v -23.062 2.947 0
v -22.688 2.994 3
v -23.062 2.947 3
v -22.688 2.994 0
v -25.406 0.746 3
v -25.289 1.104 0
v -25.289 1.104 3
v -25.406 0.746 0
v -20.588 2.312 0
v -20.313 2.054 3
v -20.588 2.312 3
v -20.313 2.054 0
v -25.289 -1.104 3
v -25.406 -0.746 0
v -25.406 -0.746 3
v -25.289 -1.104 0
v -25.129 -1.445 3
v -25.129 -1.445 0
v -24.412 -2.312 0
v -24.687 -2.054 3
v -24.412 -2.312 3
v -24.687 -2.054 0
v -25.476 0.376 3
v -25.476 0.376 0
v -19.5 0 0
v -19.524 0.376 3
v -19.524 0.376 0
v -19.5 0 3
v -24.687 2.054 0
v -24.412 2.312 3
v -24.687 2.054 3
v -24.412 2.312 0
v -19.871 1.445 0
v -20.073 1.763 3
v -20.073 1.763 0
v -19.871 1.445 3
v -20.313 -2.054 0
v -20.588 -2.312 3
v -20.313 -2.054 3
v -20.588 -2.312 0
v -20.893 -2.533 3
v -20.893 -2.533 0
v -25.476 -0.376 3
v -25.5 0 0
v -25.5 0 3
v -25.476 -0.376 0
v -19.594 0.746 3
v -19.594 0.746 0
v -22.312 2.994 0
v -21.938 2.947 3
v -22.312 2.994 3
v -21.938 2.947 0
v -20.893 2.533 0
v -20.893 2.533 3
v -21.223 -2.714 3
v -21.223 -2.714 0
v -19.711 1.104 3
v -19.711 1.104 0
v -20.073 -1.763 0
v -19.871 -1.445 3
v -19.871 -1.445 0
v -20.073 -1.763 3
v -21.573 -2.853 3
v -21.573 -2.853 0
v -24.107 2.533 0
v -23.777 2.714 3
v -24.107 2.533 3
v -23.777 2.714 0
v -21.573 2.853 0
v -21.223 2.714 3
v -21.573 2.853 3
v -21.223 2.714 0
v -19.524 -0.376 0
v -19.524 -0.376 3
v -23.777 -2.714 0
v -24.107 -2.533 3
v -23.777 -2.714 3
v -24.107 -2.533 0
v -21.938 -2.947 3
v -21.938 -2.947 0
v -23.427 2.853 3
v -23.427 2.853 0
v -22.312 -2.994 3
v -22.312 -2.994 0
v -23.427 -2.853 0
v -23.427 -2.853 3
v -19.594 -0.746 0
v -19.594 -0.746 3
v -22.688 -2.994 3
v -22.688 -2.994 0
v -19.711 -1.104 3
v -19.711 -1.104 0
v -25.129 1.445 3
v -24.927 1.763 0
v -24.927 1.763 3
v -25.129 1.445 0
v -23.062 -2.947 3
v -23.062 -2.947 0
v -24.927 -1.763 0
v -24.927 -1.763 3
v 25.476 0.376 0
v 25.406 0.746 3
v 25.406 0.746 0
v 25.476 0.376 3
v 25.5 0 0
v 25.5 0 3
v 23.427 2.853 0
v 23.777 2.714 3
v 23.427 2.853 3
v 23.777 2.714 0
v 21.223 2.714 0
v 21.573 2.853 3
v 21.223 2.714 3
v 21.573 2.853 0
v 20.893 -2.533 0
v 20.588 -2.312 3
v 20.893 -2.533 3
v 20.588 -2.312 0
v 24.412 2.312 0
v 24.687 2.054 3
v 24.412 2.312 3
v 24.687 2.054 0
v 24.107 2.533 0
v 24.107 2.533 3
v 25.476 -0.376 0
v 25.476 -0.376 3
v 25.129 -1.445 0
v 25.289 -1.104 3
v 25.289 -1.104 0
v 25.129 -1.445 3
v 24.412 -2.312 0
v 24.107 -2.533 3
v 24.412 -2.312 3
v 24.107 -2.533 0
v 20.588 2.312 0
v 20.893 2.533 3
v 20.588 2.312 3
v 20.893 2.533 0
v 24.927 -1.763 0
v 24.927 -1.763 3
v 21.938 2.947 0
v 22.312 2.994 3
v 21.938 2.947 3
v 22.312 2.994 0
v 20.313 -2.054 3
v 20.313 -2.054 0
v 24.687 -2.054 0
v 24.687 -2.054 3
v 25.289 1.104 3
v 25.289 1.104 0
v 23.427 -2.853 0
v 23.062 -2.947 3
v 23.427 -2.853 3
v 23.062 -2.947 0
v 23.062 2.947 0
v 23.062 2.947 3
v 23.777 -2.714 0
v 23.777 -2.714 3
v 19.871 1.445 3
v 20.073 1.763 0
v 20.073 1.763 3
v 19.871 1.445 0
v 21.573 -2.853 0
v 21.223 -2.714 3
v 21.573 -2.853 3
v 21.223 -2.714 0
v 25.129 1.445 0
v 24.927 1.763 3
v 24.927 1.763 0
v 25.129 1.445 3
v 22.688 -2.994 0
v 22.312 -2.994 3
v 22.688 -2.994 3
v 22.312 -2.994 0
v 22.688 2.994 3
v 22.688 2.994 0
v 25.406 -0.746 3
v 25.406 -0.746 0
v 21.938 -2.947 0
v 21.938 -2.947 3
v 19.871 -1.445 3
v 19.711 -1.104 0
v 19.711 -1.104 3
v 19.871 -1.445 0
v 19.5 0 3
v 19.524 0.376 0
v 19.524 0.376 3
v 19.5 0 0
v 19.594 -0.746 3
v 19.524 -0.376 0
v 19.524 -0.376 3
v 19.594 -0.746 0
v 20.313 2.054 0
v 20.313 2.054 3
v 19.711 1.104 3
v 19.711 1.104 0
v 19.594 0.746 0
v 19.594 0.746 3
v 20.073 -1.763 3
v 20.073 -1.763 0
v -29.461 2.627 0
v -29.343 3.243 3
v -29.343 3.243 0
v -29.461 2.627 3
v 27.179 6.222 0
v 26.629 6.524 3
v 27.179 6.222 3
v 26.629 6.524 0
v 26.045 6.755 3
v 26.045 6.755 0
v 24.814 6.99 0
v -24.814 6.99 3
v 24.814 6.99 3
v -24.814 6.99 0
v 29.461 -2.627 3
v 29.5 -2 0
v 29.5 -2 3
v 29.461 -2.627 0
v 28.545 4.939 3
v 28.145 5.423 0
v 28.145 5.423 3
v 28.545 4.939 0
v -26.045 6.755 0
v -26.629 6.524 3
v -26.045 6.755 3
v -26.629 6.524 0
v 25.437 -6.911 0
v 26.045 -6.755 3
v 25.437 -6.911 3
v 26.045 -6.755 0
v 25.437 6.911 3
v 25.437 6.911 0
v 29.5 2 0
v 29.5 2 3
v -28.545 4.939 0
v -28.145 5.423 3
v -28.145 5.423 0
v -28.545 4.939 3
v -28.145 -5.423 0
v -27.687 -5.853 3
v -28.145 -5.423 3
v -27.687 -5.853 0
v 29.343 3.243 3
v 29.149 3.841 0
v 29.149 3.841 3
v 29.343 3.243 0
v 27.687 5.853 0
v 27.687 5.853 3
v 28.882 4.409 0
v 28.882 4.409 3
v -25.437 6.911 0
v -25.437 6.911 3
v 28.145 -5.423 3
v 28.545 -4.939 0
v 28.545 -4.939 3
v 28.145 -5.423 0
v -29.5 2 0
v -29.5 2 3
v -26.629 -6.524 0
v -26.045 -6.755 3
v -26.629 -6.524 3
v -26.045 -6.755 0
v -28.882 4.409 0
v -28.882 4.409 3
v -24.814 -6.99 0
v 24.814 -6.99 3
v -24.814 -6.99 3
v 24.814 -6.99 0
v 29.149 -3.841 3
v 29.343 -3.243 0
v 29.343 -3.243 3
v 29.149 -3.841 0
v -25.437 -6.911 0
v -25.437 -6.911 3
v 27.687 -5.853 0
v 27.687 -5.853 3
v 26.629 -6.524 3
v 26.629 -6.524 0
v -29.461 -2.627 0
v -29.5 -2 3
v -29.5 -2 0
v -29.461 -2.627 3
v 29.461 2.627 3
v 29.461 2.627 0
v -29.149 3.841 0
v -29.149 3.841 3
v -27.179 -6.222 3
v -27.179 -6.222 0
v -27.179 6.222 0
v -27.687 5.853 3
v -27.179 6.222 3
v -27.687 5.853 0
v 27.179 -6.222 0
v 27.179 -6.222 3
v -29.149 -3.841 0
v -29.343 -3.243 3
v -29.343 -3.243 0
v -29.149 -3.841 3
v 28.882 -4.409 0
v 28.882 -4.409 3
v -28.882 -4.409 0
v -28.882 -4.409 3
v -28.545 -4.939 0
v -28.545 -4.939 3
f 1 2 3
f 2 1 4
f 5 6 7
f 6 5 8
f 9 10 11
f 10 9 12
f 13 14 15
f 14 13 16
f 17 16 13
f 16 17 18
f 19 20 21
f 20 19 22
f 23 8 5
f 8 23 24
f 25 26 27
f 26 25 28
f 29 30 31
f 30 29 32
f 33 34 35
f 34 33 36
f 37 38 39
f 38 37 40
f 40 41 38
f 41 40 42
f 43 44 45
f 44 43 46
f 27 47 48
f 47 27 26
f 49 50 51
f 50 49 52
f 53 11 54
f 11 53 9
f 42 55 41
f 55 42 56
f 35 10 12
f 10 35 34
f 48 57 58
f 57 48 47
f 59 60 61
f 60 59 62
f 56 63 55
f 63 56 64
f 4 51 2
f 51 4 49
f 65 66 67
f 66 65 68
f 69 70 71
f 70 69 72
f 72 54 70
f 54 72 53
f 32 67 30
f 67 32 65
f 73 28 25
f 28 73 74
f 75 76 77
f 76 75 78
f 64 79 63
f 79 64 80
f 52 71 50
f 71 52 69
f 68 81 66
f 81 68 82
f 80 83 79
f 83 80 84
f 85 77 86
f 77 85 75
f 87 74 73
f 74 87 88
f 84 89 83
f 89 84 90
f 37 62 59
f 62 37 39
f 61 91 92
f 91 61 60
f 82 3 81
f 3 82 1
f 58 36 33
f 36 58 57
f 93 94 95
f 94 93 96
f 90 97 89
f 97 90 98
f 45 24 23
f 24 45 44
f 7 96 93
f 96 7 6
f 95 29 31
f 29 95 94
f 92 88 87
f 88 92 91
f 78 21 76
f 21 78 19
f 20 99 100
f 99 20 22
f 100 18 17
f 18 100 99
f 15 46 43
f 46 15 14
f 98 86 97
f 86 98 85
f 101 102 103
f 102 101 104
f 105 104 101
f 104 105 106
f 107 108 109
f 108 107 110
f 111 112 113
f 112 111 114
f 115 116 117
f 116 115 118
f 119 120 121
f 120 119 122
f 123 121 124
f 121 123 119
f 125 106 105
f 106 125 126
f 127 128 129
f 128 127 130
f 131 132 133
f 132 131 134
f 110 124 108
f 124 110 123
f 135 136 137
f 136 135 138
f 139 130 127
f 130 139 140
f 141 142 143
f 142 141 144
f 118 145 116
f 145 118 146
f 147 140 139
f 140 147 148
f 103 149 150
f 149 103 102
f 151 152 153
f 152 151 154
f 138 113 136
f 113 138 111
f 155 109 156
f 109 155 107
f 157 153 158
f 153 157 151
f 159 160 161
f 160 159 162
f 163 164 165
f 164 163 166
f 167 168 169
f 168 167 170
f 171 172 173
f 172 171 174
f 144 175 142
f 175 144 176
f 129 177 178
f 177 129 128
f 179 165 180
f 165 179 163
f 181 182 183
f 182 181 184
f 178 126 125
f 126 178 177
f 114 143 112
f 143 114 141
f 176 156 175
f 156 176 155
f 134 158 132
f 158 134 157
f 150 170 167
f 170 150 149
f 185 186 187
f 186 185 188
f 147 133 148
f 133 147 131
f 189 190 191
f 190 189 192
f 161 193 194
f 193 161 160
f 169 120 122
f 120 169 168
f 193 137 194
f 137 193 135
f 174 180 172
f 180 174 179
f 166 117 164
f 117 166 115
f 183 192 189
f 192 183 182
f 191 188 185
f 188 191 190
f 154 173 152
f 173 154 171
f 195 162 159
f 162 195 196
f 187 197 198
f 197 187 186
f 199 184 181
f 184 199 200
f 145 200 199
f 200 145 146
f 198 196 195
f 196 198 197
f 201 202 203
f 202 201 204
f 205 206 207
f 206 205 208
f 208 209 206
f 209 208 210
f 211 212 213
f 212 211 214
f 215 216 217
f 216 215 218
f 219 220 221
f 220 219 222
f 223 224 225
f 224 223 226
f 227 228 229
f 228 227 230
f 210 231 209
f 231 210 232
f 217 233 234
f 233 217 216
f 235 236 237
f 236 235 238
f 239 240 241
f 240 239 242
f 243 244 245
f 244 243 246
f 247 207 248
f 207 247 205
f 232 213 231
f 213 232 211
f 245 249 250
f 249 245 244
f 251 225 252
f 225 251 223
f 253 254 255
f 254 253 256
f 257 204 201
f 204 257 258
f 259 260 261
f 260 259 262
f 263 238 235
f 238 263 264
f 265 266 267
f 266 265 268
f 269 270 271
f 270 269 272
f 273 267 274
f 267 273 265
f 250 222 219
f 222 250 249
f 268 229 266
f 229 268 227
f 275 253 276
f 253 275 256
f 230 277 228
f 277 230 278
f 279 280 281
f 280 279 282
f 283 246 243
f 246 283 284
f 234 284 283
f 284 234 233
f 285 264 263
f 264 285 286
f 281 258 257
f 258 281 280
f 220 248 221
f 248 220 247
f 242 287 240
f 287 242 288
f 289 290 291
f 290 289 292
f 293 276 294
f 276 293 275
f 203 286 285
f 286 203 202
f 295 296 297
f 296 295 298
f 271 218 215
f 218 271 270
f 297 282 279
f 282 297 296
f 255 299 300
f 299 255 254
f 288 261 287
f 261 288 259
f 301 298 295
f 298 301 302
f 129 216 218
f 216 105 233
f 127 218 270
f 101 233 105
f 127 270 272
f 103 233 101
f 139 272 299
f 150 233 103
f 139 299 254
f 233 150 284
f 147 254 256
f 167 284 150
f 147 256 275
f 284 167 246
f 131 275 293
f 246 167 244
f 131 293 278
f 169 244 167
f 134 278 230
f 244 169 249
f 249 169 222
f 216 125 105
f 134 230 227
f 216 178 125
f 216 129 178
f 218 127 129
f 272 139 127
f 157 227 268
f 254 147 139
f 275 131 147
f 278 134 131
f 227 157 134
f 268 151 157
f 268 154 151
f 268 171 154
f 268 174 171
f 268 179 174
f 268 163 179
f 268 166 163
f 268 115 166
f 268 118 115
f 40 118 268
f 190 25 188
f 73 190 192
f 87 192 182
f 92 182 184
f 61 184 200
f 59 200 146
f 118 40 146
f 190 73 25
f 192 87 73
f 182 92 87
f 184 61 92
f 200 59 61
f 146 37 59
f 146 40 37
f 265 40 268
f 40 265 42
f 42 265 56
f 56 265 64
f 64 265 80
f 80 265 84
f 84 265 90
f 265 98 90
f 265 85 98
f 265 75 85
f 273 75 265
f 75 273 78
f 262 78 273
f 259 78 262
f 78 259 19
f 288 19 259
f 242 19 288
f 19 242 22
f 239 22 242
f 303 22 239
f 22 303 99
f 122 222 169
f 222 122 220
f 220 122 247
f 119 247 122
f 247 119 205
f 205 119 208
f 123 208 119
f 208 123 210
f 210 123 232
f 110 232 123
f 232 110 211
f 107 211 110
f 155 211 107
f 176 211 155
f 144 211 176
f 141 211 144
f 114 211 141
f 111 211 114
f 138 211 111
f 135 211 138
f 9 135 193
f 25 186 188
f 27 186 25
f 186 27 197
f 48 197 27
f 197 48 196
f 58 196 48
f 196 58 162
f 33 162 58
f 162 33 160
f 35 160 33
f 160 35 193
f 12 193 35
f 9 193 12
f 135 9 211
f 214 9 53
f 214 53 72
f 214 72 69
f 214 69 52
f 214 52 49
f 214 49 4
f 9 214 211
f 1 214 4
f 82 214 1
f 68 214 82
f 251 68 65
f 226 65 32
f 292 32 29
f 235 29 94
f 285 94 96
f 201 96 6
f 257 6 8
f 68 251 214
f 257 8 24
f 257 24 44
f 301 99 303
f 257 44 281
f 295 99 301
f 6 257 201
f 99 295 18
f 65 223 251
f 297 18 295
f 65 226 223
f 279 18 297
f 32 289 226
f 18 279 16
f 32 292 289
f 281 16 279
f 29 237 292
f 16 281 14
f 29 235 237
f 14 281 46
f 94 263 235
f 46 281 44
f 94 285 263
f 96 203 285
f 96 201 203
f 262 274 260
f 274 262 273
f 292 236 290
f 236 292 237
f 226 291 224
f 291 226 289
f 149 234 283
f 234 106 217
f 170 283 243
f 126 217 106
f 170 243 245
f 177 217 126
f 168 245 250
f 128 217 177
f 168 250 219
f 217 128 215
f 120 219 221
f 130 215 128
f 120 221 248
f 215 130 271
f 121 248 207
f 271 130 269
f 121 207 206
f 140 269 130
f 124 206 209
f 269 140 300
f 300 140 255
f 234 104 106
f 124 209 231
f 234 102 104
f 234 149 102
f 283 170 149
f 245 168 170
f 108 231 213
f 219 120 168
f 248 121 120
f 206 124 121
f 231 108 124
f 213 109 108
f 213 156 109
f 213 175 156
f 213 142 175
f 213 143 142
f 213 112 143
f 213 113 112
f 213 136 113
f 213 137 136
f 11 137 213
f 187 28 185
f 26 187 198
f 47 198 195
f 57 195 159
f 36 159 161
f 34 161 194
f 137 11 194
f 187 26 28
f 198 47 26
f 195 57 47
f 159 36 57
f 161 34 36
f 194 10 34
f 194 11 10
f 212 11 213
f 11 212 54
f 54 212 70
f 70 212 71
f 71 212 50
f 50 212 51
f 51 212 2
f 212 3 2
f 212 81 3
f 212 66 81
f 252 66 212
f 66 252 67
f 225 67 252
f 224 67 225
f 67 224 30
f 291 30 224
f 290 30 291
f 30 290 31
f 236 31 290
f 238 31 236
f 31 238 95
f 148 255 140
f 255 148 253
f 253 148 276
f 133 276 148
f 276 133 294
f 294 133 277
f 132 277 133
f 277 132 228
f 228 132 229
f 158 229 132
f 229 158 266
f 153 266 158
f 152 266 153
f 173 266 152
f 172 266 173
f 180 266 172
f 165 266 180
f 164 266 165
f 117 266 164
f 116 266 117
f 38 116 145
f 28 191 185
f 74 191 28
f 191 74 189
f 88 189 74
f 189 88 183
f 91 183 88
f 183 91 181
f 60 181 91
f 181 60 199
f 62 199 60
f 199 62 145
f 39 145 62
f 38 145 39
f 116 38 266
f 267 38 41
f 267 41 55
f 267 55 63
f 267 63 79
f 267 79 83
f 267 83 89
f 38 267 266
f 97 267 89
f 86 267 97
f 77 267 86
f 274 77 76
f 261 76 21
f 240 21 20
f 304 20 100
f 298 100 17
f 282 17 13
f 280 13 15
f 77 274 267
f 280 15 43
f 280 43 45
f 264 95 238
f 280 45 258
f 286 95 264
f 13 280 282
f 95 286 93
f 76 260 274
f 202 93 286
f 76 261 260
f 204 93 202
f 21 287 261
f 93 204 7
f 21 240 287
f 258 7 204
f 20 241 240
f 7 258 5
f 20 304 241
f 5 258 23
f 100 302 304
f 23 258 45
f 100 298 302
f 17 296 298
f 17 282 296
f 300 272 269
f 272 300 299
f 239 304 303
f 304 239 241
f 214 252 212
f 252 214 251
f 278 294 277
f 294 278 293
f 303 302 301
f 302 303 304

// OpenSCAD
$fn = 50;


difference() {
	union() {
		hull() {
			translate(v = [-24.5000000000, 2.0000000000, 0]) {
				cylinder(h = 3, r = 5);
			}
			translate(v = [24.5000000000, 2.0000000000, 0]) {
				cylinder(h = 3, r = 5);
			}
			translate(v = [-24.5000000000, -2.0000000000, 0]) {
				cylinder(h = 3, r = 5);
			}
			translate(v = [24.5000000000, -2.0000000000, 0]) {
				cylinder(h = 3, r = 5);
			}
		}
	}
	union() {
		translate(v = [-22.5000000000, 0.0000000000, -100.0000000000]) {
			cylinder(h = 200, r = 3.0000000000);
		}
		translate(v = [-22.5000000000, 0.0000000000, -100.0000000000]) {
			cylinder(h = 200, r = 3.0000000000);
		}
		translate(v = [22.5000000000, 0.0000000000, -100.0000000000]) {
			cylinder(h = 200, r = 3.0000000000);
		}
		translate(v = [22.5000000000, 0.0000000000, -100.0000000000]) {
			cylinder(h = 200, r = 3.0000000000);
		}
	}
}
